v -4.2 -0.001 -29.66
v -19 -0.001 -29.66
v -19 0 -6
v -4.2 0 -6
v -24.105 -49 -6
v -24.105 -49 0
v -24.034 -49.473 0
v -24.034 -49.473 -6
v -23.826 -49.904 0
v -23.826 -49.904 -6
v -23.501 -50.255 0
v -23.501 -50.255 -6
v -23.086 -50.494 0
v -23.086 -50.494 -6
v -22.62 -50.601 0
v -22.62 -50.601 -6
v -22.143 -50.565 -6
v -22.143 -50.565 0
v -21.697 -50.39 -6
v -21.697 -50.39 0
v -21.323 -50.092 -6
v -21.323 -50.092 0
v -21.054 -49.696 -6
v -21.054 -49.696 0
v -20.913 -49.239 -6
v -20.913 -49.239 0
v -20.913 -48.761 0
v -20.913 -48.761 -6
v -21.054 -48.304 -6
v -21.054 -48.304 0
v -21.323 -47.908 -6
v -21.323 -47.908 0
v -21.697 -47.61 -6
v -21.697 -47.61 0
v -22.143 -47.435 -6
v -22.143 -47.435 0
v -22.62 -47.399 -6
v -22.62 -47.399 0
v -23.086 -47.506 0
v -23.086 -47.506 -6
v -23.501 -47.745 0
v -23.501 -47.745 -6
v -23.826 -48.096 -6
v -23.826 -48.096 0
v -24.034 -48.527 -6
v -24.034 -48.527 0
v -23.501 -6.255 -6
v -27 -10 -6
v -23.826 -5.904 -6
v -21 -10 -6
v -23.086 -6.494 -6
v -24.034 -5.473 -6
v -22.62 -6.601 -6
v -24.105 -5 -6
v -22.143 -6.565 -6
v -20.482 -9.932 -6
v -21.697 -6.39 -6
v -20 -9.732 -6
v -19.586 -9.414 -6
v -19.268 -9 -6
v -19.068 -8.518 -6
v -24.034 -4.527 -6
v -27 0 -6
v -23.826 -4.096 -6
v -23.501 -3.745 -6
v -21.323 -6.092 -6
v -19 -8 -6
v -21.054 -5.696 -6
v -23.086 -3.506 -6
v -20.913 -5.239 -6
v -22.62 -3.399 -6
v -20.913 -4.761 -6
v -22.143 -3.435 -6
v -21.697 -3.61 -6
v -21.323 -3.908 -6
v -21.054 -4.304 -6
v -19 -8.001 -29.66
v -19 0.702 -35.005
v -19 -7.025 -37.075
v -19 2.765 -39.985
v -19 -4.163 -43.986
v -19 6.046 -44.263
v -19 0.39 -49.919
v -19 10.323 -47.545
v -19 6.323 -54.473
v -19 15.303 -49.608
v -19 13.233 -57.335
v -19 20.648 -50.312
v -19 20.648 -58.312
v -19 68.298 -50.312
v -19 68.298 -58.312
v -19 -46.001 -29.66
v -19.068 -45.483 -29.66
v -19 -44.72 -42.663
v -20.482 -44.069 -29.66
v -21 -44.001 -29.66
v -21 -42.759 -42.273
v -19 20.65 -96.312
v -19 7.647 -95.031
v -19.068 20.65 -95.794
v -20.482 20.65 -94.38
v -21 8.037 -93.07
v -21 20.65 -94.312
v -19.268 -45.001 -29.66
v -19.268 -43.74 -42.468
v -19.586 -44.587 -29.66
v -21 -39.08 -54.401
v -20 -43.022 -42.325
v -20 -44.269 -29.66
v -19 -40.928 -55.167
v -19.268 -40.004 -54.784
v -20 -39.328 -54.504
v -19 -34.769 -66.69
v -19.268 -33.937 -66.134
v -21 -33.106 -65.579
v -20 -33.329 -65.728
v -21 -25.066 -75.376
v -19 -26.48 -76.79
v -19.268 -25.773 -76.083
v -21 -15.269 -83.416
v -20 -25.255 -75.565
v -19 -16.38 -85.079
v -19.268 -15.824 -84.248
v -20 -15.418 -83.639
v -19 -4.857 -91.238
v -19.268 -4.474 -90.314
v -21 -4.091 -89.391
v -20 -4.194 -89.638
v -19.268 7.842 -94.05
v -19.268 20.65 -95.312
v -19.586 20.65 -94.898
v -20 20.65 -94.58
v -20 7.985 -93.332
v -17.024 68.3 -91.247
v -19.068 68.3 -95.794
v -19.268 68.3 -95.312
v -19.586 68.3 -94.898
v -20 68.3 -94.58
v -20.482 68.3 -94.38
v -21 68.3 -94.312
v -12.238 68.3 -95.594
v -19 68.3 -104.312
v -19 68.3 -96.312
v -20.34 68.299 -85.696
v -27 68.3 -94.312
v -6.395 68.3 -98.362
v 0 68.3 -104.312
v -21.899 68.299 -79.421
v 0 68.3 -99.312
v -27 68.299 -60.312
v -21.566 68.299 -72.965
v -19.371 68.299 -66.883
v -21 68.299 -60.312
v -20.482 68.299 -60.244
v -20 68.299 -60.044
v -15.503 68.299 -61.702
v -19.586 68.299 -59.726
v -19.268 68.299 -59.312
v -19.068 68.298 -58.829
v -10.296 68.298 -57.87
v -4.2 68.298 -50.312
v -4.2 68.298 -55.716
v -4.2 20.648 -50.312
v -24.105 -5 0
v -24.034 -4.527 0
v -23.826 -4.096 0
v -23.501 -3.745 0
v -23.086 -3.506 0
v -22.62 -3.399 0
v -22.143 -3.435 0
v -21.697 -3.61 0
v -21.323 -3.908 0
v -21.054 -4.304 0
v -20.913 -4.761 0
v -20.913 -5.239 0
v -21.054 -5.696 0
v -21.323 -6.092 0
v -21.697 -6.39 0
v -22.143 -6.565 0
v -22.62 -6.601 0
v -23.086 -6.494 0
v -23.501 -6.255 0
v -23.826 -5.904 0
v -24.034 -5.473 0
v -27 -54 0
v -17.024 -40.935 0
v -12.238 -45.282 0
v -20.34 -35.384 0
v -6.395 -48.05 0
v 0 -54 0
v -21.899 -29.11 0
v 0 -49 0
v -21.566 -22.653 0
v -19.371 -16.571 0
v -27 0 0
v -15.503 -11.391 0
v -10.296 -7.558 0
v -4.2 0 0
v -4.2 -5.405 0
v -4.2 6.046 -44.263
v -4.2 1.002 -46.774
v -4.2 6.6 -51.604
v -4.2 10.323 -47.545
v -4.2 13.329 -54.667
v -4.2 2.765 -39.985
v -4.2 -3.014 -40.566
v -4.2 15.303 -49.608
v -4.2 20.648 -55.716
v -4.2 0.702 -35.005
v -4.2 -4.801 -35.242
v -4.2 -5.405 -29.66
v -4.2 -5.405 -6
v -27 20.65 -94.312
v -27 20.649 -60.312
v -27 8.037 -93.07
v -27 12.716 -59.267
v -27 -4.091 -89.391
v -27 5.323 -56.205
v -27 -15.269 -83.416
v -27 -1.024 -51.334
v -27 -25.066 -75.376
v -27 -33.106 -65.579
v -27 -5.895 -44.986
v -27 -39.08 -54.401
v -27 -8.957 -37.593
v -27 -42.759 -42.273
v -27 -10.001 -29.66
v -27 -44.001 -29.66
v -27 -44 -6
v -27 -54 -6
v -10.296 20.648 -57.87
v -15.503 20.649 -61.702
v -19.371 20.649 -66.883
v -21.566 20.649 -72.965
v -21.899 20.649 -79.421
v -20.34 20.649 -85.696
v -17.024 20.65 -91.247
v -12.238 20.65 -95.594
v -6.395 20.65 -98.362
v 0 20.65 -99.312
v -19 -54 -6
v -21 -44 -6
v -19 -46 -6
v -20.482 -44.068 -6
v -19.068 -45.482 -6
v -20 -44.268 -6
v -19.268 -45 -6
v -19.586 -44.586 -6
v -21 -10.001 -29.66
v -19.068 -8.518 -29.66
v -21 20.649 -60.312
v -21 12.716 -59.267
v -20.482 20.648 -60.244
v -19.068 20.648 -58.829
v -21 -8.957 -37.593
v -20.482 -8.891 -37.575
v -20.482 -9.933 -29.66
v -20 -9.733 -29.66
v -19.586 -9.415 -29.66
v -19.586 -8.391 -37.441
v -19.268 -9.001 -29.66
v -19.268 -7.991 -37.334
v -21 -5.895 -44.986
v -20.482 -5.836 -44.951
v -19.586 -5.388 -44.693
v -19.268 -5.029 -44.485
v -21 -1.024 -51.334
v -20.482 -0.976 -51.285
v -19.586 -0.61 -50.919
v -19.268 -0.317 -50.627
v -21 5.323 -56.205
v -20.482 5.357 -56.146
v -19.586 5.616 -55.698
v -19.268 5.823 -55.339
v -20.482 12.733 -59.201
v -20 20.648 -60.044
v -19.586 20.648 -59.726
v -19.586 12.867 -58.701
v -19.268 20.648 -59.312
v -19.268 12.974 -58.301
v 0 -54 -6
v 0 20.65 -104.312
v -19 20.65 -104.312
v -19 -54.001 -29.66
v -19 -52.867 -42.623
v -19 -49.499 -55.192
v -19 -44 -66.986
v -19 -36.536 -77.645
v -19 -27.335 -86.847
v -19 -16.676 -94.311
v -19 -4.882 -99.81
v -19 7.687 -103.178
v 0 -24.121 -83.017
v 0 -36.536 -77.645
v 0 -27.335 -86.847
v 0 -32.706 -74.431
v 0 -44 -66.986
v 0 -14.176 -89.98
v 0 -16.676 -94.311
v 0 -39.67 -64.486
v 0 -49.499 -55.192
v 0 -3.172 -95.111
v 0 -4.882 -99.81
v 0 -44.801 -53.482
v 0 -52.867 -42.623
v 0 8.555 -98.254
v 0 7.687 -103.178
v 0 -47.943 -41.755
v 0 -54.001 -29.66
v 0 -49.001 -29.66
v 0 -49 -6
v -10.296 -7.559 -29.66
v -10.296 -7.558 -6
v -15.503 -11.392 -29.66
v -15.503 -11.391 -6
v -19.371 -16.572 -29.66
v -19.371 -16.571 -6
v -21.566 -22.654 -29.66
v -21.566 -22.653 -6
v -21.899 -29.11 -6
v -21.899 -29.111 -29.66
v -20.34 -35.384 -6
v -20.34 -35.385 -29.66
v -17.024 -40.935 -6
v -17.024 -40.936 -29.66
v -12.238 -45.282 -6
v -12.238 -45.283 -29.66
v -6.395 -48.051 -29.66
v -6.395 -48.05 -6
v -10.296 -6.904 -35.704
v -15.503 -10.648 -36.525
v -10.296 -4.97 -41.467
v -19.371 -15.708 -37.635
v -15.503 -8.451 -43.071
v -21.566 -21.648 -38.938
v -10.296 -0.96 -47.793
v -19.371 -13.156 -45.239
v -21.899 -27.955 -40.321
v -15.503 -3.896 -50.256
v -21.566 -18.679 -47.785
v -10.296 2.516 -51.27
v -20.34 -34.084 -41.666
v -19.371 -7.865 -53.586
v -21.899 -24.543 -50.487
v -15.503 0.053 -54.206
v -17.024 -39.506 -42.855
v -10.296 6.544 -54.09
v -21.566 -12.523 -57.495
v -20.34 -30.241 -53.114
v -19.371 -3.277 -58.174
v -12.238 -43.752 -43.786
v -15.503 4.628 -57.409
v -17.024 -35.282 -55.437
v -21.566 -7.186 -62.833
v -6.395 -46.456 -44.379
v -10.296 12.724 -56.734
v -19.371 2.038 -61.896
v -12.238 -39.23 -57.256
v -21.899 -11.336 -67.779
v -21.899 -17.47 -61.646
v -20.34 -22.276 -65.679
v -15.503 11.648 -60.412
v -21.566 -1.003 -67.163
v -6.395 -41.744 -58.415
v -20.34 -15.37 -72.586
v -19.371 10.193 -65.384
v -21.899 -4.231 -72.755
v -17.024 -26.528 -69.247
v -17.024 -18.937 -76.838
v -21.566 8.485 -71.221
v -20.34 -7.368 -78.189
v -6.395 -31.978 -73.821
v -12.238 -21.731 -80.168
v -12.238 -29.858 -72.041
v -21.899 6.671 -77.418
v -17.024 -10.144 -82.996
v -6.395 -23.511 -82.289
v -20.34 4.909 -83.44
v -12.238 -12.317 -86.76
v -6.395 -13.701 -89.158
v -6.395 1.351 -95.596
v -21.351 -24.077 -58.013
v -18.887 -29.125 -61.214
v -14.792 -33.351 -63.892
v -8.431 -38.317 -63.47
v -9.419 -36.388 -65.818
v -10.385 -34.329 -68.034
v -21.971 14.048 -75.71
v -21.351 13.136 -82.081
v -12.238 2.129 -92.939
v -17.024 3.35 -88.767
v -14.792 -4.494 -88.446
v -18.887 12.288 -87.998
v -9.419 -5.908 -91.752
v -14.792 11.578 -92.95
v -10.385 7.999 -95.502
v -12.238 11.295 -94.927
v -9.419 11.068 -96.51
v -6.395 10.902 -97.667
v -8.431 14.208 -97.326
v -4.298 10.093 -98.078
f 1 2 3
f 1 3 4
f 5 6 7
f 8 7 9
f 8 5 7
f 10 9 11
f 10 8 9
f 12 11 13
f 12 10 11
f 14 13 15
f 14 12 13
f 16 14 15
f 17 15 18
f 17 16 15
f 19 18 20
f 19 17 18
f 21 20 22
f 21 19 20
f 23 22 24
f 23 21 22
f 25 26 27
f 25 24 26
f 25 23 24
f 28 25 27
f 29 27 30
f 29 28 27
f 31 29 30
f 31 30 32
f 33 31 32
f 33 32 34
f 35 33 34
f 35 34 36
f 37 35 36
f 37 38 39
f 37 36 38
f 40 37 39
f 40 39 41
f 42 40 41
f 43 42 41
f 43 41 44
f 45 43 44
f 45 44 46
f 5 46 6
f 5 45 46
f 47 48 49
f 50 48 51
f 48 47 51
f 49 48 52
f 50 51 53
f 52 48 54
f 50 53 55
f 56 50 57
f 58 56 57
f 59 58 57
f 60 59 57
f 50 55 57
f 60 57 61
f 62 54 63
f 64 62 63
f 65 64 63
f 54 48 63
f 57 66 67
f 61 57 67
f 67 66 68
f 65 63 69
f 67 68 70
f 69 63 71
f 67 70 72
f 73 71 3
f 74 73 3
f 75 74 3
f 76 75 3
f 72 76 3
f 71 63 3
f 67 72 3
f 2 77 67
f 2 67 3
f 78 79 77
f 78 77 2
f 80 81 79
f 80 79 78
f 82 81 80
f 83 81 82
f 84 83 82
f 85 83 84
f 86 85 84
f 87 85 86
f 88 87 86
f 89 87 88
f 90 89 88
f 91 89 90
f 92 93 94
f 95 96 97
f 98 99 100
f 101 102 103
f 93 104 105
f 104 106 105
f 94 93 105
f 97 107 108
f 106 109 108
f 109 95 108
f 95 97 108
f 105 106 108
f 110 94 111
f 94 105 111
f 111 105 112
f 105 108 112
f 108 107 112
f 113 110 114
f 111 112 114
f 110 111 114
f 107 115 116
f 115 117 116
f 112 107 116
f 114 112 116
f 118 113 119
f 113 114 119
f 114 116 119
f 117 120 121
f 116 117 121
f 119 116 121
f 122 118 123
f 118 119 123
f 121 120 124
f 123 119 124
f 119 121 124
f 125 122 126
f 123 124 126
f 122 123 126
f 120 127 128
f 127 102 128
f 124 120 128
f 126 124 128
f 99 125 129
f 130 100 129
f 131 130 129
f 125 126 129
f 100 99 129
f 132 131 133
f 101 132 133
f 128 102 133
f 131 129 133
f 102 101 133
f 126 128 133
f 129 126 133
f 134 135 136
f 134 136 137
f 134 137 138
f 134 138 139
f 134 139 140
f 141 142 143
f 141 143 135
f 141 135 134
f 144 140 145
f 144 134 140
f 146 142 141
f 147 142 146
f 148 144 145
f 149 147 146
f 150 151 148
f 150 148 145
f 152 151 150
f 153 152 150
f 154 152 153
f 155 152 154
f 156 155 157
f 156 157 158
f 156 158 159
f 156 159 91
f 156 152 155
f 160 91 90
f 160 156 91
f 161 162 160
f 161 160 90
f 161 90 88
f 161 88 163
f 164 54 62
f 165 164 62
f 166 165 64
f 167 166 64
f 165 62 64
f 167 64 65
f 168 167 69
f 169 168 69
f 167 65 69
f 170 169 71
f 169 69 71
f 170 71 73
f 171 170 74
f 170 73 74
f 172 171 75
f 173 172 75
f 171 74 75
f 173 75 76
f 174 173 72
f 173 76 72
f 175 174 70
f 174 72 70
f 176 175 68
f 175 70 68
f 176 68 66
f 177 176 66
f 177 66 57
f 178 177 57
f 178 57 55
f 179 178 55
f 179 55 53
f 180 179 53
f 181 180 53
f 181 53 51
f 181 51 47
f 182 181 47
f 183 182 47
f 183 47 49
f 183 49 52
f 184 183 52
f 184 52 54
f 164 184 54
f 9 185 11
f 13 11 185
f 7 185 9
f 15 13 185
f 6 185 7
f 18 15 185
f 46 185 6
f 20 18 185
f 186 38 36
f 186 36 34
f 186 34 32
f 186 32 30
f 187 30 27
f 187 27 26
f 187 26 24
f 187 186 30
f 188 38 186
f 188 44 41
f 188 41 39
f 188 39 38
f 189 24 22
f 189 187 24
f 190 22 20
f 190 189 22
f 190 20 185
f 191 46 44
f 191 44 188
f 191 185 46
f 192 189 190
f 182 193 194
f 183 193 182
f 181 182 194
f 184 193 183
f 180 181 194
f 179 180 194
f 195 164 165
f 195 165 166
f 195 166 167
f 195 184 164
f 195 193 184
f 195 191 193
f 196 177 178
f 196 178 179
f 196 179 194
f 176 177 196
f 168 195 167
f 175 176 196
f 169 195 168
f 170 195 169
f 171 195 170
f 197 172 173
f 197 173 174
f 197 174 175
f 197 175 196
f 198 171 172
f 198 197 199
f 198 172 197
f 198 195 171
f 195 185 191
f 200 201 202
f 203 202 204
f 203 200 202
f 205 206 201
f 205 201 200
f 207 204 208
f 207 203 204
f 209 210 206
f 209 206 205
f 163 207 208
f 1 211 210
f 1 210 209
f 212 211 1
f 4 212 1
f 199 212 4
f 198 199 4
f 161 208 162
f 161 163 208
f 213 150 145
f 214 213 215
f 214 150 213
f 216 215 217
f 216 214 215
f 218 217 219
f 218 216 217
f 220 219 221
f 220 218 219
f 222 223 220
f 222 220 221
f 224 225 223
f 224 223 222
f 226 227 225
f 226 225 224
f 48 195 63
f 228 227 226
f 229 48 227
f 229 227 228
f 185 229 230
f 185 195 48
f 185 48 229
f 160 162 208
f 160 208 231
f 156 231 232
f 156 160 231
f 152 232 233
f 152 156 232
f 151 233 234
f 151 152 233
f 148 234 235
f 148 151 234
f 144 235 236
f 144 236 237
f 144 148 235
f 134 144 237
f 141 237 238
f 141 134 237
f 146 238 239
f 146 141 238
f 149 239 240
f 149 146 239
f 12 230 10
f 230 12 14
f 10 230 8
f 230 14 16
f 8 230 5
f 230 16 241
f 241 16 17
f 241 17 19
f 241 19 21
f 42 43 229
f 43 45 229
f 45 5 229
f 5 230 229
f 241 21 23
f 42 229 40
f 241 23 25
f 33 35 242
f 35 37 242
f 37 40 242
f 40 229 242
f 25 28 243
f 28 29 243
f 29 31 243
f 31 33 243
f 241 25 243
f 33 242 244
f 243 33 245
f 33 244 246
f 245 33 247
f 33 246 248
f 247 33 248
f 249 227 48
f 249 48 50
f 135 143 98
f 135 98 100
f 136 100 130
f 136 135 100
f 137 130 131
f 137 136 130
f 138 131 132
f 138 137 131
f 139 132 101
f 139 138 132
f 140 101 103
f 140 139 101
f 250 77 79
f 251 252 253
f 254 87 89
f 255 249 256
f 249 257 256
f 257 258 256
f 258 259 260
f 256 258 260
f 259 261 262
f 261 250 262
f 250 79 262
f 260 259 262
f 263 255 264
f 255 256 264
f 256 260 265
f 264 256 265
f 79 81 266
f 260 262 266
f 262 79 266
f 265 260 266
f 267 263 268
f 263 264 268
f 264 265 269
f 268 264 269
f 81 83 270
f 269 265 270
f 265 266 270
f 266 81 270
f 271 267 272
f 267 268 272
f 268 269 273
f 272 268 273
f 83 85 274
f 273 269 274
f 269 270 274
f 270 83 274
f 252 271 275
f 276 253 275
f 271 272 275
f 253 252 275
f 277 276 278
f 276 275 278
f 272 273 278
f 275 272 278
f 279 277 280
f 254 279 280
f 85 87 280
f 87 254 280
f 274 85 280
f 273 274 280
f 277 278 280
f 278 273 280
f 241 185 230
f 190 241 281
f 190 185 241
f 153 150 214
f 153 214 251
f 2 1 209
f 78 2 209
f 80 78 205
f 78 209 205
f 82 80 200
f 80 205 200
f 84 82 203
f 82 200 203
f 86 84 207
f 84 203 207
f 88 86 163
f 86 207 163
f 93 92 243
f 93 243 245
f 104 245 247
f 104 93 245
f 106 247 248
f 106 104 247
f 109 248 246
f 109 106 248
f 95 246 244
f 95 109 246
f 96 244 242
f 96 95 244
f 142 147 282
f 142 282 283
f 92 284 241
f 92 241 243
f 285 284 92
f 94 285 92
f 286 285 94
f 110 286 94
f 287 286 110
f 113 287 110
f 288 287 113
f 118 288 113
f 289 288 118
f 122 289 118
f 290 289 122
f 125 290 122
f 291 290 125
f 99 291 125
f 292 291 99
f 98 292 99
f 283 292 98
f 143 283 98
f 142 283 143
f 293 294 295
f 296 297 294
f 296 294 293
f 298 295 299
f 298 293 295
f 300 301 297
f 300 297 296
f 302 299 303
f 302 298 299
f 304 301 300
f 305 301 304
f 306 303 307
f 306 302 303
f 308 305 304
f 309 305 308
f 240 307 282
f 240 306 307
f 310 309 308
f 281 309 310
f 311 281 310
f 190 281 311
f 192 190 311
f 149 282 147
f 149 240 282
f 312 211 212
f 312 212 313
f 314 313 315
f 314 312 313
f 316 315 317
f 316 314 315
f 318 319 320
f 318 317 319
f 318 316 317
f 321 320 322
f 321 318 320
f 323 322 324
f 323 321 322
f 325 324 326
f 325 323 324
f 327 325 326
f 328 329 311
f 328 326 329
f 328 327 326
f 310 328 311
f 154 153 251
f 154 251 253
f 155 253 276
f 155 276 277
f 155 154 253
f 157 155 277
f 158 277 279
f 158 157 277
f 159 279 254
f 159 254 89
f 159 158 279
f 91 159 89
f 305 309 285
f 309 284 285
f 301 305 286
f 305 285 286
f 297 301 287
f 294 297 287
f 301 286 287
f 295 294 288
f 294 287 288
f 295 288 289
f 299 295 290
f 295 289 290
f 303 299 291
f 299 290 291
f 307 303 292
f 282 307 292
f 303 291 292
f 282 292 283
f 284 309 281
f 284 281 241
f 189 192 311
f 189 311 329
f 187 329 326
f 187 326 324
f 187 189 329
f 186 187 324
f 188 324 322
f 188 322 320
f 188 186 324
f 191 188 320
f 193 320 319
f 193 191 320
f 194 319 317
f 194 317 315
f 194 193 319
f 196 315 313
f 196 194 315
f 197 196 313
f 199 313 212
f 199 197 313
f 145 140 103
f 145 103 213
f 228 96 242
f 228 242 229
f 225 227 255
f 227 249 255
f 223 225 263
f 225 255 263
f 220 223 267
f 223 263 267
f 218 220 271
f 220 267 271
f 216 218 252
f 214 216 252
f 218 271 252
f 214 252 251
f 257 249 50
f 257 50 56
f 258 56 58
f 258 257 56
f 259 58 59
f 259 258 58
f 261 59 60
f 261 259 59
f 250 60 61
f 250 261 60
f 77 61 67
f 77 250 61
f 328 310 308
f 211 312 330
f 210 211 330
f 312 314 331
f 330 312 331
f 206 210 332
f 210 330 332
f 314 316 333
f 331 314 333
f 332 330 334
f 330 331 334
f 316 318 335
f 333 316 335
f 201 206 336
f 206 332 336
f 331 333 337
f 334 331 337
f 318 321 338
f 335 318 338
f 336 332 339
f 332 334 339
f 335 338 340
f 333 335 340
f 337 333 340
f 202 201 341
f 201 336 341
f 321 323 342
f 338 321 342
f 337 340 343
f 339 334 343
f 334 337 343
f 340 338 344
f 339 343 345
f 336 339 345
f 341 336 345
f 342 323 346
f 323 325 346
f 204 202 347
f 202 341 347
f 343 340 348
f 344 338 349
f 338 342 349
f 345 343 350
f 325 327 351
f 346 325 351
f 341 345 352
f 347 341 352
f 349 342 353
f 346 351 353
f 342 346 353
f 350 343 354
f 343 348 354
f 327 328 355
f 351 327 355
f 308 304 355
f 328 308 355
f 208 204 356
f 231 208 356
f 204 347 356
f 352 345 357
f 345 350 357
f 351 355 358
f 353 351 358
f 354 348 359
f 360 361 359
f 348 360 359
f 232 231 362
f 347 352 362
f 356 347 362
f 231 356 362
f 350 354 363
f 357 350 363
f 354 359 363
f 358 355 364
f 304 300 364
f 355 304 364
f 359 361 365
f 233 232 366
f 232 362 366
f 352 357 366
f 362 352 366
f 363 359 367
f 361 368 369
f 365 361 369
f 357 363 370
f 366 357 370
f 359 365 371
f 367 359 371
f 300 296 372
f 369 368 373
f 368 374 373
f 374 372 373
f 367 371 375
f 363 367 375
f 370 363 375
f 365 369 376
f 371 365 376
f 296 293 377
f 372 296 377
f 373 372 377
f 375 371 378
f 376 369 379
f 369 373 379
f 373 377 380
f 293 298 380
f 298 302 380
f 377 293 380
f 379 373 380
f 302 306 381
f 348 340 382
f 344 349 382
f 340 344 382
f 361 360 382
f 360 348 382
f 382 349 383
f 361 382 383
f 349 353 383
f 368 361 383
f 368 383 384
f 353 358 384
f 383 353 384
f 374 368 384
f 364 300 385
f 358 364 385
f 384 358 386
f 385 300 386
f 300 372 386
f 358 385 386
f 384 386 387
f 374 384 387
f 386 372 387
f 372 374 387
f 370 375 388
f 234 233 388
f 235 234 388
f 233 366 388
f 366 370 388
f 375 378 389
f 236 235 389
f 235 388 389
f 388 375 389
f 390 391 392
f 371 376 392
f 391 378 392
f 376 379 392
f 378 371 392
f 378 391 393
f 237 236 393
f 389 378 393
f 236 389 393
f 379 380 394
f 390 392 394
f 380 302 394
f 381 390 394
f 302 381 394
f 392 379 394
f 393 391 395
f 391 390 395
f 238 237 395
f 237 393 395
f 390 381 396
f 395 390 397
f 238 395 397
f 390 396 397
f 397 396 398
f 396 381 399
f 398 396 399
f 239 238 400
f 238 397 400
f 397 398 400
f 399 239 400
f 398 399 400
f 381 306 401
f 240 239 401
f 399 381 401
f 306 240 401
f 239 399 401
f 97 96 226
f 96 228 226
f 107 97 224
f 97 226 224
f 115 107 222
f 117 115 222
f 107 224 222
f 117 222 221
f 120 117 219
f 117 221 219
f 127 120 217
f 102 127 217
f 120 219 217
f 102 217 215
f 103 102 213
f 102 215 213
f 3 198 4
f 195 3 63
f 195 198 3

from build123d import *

# Parameters (mm, degrees)
EXTRUDE_1_DEPTH     = 6
SKETCH_4_R          = 1.605
CUT_EXTRUDE_1_DEPTH = 10
SWEEP_START         = -4.2
SWEEP_1_2_DEPTH     = 4.2


# Read off the part's stored shape, not the designer's step: 切除-扫描1
with BuildPart() as part:
    # 草图1 → 凸台-拉伸1 (new body)
    with BuildSketch(Plane.XY):
        with BuildLine():
            Line((0, 0), (-27, 0))
            Line((-27, 0), (-27, -54))
            Line((-27, -54), (0, -54))
            Line((0, -54), (0, -49))
            ThreePointArc((0, -49), (-22, -27), (0, -5))
            Line((0, -5), (0, 0))
        make_face()
    extrude(amount=-EXTRUDE_1_DEPTH)

    # Sweep 1: sweep along a path in 草图3
    with BuildLine(Plane(origin=(0, 0, 0), x_dir=(0, 0, -1), z_dir=(1, 0, 0))) as sweep_1_path:
        Line((6, -27), (29.659999985, -27.000851338))
        ThreePointArc((29.659999985, -27.000851338), (63.354746468, -13.045095672), (77.311714535, 20.649148631))
        Line((77.311714535, 20.649148631), (77.311714535, 68.299148631))
    # 草图2 → Sweep 1 (sweep)
    with BuildSketch(Plane(origin=(0, 0, -6), x_dir=(-1, 0, 0), z_dir=(0, 0, -1))):
        with BuildLine():
            Line((19, 0), (19, -8))
            ThreePointArc((19, -8), (19.585786438, -9.414213562), (21, -10))
            Line((21, -10), (27, -10))
            Line((27, -10), (27, -44))
            Line((27, -44), (21, -44))
            ThreePointArc((21, -44), (19.585786438, -44.585786438), (19, -46))
            Line((19, -46), (19, -54))
            Line((19, -54), (0, -54))
            Line((0, -54), (0, -49))
            ThreePointArc((0, -49), (22, -27), (0, -5))
            Line((0, -5), (0, 0))
            Line((0, 0), (19, 0))
        make_face()
    sweep(path=sweep_1_path.line)

    # 草图4 → 切除-拉伸1 (cut)
    with BuildSketch(Plane(origin=(0, 0, -6), x_dir=(-1, 0, 0), z_dir=(0, 0, -1))):
        with Locations((22.5, -5)):
            Circle(SKETCH_4_R)
    cut_extrude_1 = extrude(amount=-CUT_EXTRUDE_1_DEPTH, mode=Mode.SUBTRACT)

    # 镜向1: 切除-拉伸1 across plane
    add(cut_extrude_1.mirror(Plane.ZX.offset(-27)), mode=Mode.SUBTRACT)

    # Sweep 1 2 outline → Sweep 1 2 (cut)
    with BuildSketch(Plane.YZ.offset(SWEEP_START)):
        with BuildLine():
            Line((-0.000851338, -29.659999985), (0, -6))
            Line((0, -6), (0, 1))
            Line((0, 1), (-7, 1))
            Line((-7, 1), (-7, -57))
            Line((-7, -57), (68.298417771, -57))
            Line((68.298417771, -57), (68.298177112, -50.311714553))
            Line((68.298177112, -50.311714553), (20.648177112, -50.311714553))
            ThreePointArc((20.648177112, -50.311714553), (6.046443933, -44.262519896), (-0.000851338, -29.659999985))
        make_face()
    extrude(amount=SWEEP_1_2_DEPTH, mode=Mode.SUBTRACT)


solid = part.part
